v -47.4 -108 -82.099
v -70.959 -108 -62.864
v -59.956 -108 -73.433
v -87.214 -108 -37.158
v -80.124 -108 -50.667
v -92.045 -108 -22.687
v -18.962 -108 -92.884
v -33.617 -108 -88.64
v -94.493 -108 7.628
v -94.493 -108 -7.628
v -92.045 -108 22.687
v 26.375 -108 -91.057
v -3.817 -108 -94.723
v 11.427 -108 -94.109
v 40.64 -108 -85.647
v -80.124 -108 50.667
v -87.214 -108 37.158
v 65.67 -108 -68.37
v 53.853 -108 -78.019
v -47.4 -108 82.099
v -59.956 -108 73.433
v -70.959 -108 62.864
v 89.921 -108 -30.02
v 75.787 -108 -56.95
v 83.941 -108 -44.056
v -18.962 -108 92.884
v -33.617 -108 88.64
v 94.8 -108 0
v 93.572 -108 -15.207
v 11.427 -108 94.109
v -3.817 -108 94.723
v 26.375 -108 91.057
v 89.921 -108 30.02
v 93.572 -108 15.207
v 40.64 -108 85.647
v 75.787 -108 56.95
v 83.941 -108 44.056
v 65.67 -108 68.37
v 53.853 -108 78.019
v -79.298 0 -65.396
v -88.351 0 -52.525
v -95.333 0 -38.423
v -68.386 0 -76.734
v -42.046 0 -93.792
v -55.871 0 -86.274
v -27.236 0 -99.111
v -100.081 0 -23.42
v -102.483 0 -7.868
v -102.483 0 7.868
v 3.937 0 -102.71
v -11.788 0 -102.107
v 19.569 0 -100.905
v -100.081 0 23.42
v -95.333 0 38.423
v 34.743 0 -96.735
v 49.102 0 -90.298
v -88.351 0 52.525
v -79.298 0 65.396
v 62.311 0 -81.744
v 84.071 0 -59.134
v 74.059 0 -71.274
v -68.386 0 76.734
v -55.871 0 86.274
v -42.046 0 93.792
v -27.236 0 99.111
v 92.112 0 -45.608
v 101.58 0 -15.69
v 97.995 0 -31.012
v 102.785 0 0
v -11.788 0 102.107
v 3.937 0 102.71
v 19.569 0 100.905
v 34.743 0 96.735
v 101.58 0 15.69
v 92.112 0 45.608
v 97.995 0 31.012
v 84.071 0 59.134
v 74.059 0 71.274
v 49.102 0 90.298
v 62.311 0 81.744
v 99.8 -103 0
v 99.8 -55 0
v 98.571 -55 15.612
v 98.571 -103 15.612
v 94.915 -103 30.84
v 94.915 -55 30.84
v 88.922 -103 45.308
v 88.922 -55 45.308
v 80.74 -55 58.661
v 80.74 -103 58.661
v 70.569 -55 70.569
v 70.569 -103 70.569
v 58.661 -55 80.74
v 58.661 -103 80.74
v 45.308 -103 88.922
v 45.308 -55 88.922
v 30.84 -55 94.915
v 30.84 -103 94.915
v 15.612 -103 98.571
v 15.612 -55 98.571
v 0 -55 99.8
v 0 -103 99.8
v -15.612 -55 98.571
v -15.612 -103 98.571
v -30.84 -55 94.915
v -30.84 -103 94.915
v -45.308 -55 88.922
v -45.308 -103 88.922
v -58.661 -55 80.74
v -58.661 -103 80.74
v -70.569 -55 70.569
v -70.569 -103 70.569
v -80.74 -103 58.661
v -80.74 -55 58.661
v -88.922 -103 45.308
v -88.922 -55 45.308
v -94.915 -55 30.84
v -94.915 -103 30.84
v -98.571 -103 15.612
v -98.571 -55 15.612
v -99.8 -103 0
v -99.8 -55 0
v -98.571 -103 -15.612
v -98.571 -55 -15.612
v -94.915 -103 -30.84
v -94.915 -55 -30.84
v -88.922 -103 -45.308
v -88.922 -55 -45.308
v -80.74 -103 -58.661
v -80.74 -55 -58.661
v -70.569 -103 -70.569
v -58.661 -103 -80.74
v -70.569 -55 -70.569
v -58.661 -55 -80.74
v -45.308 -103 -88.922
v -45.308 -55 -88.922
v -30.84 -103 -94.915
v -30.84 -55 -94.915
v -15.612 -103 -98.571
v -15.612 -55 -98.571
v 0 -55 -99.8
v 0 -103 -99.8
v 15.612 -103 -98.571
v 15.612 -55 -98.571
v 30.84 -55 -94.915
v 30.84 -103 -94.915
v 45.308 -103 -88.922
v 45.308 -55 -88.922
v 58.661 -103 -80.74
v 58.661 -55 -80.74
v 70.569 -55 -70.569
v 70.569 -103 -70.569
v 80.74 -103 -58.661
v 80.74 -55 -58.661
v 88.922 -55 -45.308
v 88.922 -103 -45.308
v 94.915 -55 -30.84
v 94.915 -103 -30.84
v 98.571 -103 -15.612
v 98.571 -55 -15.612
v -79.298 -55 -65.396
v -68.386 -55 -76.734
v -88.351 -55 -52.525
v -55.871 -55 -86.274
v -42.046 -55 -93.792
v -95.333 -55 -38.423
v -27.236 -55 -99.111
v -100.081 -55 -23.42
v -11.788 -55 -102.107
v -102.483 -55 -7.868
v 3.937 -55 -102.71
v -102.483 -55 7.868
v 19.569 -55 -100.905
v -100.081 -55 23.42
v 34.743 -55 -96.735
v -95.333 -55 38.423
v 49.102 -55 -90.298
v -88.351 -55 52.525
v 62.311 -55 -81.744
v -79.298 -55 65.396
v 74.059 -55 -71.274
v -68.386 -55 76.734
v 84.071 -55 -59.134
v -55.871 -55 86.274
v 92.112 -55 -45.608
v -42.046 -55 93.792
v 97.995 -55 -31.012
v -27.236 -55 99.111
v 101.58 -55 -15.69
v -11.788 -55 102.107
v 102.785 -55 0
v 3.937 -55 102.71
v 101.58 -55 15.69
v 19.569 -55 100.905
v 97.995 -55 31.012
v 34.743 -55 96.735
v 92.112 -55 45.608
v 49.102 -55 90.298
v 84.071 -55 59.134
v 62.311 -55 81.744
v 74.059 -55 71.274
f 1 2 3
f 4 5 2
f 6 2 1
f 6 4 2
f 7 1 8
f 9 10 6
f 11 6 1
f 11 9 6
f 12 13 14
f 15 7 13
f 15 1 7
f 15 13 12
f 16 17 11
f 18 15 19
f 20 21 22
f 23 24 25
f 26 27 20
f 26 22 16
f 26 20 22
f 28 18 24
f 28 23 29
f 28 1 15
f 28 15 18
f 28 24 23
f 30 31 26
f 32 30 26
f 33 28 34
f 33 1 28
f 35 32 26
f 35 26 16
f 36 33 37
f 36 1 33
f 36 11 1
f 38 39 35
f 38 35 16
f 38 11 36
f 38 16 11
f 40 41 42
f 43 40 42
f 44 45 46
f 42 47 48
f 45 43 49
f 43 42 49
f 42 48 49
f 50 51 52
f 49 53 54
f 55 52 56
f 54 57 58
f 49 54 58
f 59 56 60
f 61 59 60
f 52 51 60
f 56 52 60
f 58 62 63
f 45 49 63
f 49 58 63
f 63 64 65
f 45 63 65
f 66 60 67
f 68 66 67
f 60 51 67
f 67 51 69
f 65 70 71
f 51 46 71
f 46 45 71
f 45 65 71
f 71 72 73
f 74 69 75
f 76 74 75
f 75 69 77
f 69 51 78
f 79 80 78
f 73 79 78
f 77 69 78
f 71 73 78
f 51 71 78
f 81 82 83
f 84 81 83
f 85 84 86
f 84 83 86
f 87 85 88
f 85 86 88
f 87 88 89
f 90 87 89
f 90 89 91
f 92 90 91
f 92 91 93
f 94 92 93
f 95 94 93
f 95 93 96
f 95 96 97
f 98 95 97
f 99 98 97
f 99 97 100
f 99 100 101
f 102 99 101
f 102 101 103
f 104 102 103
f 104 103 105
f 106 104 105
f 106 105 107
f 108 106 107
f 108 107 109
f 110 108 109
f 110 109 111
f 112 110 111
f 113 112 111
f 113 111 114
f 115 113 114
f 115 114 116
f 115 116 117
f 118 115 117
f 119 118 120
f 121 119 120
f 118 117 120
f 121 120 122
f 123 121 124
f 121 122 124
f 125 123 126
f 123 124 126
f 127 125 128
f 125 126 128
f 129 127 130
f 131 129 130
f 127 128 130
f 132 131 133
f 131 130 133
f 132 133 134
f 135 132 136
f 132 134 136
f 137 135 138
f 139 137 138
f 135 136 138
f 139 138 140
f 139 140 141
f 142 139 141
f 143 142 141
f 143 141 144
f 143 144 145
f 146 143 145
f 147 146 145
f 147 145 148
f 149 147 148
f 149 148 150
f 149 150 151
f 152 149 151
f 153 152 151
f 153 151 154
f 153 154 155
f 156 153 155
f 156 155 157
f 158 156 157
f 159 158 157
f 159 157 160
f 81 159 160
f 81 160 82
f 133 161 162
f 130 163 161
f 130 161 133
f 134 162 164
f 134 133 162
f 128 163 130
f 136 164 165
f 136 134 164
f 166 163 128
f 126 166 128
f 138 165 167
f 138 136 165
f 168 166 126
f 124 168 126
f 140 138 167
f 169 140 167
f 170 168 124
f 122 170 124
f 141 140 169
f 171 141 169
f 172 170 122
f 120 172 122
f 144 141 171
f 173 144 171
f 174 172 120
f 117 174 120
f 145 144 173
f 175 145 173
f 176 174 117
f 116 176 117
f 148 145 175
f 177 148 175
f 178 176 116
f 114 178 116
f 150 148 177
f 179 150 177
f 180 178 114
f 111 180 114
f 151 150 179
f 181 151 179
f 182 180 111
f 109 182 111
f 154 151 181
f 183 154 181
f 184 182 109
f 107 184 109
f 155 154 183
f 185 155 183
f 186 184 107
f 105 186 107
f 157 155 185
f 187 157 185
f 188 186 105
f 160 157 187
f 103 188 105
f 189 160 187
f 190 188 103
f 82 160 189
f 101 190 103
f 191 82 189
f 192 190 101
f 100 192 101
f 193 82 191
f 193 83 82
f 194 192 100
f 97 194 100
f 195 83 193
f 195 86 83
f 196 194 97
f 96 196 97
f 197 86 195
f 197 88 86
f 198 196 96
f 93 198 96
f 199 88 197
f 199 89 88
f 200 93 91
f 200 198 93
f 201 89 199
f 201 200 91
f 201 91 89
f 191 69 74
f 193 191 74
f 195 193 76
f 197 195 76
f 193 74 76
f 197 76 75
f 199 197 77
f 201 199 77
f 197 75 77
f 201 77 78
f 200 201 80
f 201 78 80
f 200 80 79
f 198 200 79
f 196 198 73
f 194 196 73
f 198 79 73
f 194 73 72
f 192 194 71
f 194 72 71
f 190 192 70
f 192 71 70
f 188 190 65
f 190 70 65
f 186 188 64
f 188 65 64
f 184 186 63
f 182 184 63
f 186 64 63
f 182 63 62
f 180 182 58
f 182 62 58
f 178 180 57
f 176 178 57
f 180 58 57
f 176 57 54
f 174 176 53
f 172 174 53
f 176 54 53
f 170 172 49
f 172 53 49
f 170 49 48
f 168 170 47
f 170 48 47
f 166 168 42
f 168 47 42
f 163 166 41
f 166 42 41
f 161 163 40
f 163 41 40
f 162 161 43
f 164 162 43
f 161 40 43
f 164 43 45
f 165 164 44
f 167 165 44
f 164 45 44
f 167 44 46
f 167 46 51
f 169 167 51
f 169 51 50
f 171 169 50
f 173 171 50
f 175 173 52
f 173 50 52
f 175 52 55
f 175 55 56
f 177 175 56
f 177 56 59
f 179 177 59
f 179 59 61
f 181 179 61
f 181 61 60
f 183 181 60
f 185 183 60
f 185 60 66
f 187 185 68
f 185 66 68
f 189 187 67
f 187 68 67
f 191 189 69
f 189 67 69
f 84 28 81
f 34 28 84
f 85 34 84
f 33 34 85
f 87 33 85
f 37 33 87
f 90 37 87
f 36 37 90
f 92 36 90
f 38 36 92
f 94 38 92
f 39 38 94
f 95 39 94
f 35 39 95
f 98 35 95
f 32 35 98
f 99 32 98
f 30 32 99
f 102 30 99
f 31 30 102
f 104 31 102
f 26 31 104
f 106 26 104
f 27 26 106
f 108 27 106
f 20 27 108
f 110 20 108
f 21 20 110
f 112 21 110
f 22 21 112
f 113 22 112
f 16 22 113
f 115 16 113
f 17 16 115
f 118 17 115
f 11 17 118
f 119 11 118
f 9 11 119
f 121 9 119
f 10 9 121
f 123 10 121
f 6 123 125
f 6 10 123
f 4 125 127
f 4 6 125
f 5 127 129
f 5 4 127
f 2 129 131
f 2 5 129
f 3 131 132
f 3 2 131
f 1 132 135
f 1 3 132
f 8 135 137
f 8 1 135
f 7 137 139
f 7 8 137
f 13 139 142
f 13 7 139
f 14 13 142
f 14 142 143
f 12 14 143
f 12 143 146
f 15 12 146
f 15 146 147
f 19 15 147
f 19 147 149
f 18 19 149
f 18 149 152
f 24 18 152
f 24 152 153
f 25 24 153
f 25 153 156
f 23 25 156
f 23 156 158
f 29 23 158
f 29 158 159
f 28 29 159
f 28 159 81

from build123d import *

# Parameters (mm, degrees)
F0_R     = 102.785
F0_R_2   = 99.8
F1_DEPTH = 55
F2_DEPTH = 108
F3_SIZE  = 5


with BuildPart() as f1:
    # F0 (on Front) → F1 (new body)
    with BuildSketch(Plane.XZ):
        Circle(F0_R)
        Circle(F0_R_2, mode=Mode.SUBTRACT)
    extrude(amount=F1_DEPTH)

    # F0 (on Front) → F2 (join)
    with BuildSketch(Plane.XZ):
        Circle(F0_R_2)
    extrude(amount=F2_DEPTH)

    # F3
    f3_edges = [f1.edges().sort_by_distance(p)[0] for p in [
        (-99.8, -108, 0),
    ]]
    chamfer(f3_edges, length=F3_SIZE)


solid = f1.part
